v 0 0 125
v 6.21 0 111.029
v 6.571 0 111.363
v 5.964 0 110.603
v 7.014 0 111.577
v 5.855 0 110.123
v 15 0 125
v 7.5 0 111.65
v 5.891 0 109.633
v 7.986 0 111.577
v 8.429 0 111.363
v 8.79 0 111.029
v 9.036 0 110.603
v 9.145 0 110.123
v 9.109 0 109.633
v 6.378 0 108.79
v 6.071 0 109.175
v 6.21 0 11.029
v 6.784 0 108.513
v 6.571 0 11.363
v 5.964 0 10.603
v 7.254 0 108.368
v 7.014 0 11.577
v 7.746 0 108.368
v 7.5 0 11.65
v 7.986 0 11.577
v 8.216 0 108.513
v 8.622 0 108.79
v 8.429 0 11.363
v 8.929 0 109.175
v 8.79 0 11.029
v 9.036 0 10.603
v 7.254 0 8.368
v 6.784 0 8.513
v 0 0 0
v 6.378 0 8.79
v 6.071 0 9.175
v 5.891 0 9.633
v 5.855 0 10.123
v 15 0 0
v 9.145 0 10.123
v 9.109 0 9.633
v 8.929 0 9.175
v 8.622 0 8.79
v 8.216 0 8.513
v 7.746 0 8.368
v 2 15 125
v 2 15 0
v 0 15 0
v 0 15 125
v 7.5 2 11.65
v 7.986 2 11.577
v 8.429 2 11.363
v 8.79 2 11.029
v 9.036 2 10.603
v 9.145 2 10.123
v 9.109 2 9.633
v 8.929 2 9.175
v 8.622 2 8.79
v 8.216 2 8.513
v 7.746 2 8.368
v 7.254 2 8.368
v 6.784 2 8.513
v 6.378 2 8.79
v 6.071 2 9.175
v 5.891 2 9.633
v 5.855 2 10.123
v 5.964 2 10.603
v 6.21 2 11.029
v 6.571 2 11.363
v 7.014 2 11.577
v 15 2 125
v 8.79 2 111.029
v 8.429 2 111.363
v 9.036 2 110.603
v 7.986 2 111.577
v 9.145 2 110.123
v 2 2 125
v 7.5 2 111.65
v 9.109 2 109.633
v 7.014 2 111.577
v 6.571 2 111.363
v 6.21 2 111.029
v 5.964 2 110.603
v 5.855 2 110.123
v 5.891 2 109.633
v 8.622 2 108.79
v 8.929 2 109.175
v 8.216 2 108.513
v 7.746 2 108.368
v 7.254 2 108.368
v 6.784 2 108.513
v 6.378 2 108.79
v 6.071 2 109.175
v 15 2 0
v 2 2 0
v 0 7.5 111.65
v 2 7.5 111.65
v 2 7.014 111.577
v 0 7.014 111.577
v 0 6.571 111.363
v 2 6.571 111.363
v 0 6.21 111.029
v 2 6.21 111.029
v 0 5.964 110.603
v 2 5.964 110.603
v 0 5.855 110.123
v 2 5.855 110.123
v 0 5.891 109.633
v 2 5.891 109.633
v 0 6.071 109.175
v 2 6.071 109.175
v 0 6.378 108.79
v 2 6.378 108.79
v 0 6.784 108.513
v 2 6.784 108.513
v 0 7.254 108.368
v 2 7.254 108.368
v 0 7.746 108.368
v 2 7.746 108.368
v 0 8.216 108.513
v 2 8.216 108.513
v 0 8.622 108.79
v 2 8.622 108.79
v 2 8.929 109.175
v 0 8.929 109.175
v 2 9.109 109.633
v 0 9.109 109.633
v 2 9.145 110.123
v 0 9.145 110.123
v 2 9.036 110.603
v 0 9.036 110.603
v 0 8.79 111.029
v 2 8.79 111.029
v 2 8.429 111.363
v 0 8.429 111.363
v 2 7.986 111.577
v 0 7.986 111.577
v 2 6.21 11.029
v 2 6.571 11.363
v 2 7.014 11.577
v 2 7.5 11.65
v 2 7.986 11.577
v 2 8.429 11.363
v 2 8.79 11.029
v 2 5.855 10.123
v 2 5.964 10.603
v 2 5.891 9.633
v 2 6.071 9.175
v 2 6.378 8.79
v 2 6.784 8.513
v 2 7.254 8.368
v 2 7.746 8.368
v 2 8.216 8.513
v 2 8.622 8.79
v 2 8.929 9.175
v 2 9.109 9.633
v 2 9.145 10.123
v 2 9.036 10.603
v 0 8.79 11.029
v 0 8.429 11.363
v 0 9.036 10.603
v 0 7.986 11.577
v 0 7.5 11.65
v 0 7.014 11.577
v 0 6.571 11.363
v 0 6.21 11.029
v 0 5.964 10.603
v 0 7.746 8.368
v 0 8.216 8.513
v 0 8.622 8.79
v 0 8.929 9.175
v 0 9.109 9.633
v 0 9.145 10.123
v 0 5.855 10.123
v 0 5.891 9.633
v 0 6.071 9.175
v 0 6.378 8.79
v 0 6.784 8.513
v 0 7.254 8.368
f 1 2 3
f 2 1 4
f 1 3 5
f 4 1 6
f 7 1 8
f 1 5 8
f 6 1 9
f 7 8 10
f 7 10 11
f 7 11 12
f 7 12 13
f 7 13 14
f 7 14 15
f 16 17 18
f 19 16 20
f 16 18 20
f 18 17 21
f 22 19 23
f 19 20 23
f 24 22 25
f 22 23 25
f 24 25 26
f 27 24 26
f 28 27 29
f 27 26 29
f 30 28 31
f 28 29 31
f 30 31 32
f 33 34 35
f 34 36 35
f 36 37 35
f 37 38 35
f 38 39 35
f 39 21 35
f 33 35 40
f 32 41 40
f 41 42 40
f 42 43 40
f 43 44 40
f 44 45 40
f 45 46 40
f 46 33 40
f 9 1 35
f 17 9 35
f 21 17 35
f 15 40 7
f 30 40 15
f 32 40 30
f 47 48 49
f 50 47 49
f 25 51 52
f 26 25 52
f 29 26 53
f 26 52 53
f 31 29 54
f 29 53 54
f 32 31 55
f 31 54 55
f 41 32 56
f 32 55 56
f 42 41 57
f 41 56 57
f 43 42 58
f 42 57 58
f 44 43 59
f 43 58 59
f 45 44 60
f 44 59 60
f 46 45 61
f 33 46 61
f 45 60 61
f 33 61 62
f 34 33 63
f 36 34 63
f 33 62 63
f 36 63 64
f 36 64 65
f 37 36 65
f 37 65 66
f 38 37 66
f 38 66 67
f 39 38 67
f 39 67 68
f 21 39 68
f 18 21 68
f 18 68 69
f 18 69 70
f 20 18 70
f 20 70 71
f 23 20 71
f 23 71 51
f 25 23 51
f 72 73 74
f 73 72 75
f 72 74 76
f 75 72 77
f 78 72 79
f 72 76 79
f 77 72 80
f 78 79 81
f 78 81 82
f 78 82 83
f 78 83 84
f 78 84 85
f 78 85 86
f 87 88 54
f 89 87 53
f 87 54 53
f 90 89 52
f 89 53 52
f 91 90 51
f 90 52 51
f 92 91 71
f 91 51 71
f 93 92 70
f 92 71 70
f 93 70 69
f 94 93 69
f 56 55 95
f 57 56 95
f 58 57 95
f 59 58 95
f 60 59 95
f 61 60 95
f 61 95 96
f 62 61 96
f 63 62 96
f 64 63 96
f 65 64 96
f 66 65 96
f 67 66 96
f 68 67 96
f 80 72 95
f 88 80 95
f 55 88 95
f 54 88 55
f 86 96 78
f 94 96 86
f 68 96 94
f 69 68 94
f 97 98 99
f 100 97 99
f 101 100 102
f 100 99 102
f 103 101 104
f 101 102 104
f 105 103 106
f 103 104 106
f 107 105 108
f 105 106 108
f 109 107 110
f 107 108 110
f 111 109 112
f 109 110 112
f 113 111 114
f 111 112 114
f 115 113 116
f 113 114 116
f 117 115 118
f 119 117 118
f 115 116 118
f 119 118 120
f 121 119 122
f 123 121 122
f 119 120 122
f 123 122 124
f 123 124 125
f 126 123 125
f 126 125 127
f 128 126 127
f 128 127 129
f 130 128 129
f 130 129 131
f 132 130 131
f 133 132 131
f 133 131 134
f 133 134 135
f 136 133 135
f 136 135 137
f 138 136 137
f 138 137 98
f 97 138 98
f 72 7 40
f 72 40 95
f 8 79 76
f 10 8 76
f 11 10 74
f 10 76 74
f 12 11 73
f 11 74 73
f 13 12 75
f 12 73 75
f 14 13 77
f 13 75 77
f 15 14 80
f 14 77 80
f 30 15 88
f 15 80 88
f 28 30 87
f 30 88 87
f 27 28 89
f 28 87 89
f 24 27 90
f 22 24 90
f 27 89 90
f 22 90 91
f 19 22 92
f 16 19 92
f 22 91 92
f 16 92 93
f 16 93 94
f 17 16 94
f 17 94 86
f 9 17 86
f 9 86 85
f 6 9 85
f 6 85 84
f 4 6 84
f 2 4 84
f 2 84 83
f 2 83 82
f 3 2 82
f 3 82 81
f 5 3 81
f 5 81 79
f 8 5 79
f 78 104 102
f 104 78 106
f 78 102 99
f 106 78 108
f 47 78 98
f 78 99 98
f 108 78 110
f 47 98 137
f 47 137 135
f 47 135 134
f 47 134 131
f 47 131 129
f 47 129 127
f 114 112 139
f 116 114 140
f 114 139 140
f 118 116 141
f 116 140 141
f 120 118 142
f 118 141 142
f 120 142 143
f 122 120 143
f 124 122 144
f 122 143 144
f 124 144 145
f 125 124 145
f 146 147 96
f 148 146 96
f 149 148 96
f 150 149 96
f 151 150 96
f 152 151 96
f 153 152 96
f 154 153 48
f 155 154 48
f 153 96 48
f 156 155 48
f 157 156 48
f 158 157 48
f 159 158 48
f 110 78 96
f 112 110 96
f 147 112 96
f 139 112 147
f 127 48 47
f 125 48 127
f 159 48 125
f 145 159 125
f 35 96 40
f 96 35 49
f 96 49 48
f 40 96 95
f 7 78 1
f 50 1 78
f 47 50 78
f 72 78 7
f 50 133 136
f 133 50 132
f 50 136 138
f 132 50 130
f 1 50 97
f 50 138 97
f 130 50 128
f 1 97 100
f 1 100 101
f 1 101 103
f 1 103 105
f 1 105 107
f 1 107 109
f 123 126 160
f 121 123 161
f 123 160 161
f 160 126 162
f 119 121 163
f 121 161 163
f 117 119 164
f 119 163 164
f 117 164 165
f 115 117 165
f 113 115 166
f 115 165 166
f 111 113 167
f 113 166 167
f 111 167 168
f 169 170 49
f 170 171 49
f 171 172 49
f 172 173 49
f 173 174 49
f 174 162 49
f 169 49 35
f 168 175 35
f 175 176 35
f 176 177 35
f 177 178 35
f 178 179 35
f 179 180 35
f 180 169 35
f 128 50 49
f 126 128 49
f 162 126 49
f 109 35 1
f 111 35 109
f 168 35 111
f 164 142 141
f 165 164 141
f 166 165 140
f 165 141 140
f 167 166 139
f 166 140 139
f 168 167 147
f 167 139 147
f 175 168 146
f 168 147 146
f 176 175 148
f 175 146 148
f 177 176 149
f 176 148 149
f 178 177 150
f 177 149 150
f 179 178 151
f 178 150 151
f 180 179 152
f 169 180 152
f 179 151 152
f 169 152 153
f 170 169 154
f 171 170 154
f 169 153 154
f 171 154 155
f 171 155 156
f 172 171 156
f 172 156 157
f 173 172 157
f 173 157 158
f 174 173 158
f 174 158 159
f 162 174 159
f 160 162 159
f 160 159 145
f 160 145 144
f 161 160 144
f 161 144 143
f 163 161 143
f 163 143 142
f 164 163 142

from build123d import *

# Parameters (mm, degrees)
EXTRUDE_1_DEPTH          = 125
M4X0_7_1_D               = 3.3
M4X0_7_1_DEPTH           = 11.5
M4X0_7_1_TIP             = 0.991420021
M4X0_7_1_ON_FACE_2_D     = 3.3
M4X0_7_1_ON_FACE_2_DEPTH = 11.5
M4X0_7_1_ON_FACE_2_TIP   = 0.991420021


with BuildPart() as part:
    # ｽｹｯﾁ1 → ﾎﾞｽ - 押し出し1 (new body)
    with BuildSketch(Plane.XY):
        Polygon((0, 0), (15, 0), (15, 2), (2, 2), (2, 15), (0, 15), align=None)
    extrude(amount=EXTRUDE_1_DEPTH)

    # M4x0.7 ねじ穴1
    with Locations(Plane(origin=(7.5, 0, 10), x_dir=(0, 0, -1), z_dir=(0, -1, 0))):
        with Locations((0, 0), (-100, 0)):
            Hole(M4X0_7_1_D / 2, depth=M4X0_7_1_DEPTH)
            with Locations((0, 0, -(M4X0_7_1_DEPTH + M4X0_7_1_TIP / 2))):  # 118° drill point
                Cone(0, M4X0_7_1_D / 2, M4X0_7_1_TIP, mode=Mode.SUBTRACT)

    # M4x0.7 ねじ穴1 on face 2
    with Locations(Plane(origin=(0, 7.5, 110), x_dir=(0, 0, -1), z_dir=(-1, 0, 0))):
        with Locations((0, 0), (100, 0)):
            Hole(M4X0_7_1_ON_FACE_2_D / 2, depth=M4X0_7_1_ON_FACE_2_DEPTH)
            with Locations((0, 0, -(M4X0_7_1_ON_FACE_2_DEPTH + M4X0_7_1_ON_FACE_2_TIP / 2))):  # 118° drill point
                Cone(0, M4X0_7_1_ON_FACE_2_D / 2, M4X0_7_1_ON_FACE_2_TIP, mode=Mode.SUBTRACT)


solid = part.part
